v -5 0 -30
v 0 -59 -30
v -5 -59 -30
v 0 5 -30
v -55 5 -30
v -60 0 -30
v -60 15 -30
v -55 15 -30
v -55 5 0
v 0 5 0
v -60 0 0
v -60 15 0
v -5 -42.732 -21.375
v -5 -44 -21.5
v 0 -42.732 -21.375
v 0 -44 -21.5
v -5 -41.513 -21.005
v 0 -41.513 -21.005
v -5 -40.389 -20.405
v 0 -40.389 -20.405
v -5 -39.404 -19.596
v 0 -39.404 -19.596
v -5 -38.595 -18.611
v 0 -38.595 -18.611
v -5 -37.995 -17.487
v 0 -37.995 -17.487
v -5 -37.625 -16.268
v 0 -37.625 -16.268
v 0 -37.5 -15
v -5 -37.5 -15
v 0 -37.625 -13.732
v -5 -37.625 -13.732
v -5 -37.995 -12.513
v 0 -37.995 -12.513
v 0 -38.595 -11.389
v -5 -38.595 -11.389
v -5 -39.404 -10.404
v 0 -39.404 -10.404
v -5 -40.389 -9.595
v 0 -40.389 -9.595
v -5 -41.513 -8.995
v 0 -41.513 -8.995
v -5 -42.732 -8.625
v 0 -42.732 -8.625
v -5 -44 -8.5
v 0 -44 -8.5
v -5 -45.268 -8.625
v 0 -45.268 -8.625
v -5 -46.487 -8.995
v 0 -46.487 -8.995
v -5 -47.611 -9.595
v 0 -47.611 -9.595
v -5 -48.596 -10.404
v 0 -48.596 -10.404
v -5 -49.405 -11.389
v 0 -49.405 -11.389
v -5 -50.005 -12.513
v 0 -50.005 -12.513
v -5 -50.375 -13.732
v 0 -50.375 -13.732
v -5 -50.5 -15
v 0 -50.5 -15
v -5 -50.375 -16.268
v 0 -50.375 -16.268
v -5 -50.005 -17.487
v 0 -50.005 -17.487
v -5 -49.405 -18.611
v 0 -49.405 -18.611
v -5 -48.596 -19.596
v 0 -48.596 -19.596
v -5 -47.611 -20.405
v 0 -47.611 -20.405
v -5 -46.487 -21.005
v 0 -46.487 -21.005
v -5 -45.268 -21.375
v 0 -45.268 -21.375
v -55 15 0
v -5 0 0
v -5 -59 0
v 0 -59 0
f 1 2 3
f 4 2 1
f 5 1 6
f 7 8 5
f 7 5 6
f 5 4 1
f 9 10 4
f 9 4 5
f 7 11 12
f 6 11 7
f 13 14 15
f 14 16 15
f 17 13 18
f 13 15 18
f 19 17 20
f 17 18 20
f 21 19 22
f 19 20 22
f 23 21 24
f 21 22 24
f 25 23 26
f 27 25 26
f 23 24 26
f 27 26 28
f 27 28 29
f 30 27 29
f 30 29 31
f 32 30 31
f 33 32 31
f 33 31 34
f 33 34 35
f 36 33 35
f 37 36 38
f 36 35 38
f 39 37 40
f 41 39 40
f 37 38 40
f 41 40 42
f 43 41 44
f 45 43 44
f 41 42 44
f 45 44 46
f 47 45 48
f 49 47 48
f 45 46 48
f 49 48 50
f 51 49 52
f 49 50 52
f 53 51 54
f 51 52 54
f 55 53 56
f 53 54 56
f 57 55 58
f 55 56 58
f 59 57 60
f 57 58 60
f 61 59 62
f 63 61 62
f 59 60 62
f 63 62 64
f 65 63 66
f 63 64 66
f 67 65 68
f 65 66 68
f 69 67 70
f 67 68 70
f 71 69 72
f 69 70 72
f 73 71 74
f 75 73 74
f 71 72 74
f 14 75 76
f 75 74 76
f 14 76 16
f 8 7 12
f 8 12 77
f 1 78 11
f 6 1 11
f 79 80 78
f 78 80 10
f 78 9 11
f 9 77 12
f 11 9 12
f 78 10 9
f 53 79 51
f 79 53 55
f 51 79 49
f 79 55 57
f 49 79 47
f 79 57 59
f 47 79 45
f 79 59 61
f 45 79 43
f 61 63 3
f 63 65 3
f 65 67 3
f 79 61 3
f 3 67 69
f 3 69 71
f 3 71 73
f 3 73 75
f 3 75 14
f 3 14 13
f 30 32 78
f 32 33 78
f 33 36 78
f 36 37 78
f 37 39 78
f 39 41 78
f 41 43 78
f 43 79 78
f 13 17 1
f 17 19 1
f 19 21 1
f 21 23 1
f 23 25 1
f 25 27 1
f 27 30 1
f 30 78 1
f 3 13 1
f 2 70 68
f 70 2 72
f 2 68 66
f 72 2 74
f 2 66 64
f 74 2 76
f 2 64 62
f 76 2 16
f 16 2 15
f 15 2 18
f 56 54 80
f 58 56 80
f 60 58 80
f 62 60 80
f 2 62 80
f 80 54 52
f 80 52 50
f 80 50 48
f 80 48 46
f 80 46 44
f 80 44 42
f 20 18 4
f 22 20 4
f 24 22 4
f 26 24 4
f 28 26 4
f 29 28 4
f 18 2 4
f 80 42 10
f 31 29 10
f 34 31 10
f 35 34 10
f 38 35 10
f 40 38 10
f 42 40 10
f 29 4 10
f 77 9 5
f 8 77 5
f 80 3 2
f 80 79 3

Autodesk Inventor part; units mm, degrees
ref_plane "YZ Plane" through (0, 0, 0) normal (1, 0, 0) x (0, 1, 0)
ref_plane "XZ Plane" through (0, 0, 0) normal (0, 1, 0) x (-1, 0, 0)
ref_plane "XY Plane" through (0, 0, 0) normal (0, 0, 1) x (1, 0, 0)
sketch "Sketch1" plane through (0, 0, 0) normal (0, 1, 0) x (-1, 0, 0)
  line L0 (0, 0) -> (60, 0)
  line L1 (60, 0) -> (60, -30)
  line L2 (60, -30) -> (0, -30)
  line L3 (0, -30) -> (0, 0)
  dimension "d0" = 60
  dimension "d1" = 30
extrude "Extrusion1" add sketch "Sketch1" along normal blind 5
sketch "Sketch2" plane through (0, 5, 0) normal (0, 1, 0) x (1, 0, 0)
  line L0 (-60, 30) -> (-60, 0) projected
  line L1 (0, 30) -> (-60, 30) projected
  line L2 (-60, 0) -> (-55, 0)
  line L3 (-55, 0) -> (-55, 30)
  line L4 (-55, 30) -> (-60, 30)
  line L5 (-60, 30) -> (-60, 0)
  point P0 (0, 0)
  dimension "d4" = 5
extrude "Extrusion2" add sketch "Sketch2" along normal blind 10
sketch "Sketch3" plane through (0, 0, 0) normal (0, -1, 0) x (1, 0, 0)
  line L0 (0, -30) -> (-60, -30) projected
  line L1 (0, 0) -> (-5, 0)
  line L2 (-5, 0) -> (-5, -30)
  line L3 (-5, -30) -> (0, -30)
  line L4 (0, -30) -> (0, 0)
  dimension "d7" = 5
extrude "Extrusion3" add sketch "Sketch3" along normal blind 59
sketch "Sketch4" plane through (0, 5, 0) normal (1, 0, 0) x (0, 0, -1)
  line L0 (0, -64) -> (30, -64) projected
  circle A0 centre (15, -49) radius 6.5
  point P0 (0, -5)
  dimension "d11" = 13
extrude "Extrusion4" cut sketch "Sketch4" against normal up to surface (5 mm away)
properties part number "Bracket_Support_2"
